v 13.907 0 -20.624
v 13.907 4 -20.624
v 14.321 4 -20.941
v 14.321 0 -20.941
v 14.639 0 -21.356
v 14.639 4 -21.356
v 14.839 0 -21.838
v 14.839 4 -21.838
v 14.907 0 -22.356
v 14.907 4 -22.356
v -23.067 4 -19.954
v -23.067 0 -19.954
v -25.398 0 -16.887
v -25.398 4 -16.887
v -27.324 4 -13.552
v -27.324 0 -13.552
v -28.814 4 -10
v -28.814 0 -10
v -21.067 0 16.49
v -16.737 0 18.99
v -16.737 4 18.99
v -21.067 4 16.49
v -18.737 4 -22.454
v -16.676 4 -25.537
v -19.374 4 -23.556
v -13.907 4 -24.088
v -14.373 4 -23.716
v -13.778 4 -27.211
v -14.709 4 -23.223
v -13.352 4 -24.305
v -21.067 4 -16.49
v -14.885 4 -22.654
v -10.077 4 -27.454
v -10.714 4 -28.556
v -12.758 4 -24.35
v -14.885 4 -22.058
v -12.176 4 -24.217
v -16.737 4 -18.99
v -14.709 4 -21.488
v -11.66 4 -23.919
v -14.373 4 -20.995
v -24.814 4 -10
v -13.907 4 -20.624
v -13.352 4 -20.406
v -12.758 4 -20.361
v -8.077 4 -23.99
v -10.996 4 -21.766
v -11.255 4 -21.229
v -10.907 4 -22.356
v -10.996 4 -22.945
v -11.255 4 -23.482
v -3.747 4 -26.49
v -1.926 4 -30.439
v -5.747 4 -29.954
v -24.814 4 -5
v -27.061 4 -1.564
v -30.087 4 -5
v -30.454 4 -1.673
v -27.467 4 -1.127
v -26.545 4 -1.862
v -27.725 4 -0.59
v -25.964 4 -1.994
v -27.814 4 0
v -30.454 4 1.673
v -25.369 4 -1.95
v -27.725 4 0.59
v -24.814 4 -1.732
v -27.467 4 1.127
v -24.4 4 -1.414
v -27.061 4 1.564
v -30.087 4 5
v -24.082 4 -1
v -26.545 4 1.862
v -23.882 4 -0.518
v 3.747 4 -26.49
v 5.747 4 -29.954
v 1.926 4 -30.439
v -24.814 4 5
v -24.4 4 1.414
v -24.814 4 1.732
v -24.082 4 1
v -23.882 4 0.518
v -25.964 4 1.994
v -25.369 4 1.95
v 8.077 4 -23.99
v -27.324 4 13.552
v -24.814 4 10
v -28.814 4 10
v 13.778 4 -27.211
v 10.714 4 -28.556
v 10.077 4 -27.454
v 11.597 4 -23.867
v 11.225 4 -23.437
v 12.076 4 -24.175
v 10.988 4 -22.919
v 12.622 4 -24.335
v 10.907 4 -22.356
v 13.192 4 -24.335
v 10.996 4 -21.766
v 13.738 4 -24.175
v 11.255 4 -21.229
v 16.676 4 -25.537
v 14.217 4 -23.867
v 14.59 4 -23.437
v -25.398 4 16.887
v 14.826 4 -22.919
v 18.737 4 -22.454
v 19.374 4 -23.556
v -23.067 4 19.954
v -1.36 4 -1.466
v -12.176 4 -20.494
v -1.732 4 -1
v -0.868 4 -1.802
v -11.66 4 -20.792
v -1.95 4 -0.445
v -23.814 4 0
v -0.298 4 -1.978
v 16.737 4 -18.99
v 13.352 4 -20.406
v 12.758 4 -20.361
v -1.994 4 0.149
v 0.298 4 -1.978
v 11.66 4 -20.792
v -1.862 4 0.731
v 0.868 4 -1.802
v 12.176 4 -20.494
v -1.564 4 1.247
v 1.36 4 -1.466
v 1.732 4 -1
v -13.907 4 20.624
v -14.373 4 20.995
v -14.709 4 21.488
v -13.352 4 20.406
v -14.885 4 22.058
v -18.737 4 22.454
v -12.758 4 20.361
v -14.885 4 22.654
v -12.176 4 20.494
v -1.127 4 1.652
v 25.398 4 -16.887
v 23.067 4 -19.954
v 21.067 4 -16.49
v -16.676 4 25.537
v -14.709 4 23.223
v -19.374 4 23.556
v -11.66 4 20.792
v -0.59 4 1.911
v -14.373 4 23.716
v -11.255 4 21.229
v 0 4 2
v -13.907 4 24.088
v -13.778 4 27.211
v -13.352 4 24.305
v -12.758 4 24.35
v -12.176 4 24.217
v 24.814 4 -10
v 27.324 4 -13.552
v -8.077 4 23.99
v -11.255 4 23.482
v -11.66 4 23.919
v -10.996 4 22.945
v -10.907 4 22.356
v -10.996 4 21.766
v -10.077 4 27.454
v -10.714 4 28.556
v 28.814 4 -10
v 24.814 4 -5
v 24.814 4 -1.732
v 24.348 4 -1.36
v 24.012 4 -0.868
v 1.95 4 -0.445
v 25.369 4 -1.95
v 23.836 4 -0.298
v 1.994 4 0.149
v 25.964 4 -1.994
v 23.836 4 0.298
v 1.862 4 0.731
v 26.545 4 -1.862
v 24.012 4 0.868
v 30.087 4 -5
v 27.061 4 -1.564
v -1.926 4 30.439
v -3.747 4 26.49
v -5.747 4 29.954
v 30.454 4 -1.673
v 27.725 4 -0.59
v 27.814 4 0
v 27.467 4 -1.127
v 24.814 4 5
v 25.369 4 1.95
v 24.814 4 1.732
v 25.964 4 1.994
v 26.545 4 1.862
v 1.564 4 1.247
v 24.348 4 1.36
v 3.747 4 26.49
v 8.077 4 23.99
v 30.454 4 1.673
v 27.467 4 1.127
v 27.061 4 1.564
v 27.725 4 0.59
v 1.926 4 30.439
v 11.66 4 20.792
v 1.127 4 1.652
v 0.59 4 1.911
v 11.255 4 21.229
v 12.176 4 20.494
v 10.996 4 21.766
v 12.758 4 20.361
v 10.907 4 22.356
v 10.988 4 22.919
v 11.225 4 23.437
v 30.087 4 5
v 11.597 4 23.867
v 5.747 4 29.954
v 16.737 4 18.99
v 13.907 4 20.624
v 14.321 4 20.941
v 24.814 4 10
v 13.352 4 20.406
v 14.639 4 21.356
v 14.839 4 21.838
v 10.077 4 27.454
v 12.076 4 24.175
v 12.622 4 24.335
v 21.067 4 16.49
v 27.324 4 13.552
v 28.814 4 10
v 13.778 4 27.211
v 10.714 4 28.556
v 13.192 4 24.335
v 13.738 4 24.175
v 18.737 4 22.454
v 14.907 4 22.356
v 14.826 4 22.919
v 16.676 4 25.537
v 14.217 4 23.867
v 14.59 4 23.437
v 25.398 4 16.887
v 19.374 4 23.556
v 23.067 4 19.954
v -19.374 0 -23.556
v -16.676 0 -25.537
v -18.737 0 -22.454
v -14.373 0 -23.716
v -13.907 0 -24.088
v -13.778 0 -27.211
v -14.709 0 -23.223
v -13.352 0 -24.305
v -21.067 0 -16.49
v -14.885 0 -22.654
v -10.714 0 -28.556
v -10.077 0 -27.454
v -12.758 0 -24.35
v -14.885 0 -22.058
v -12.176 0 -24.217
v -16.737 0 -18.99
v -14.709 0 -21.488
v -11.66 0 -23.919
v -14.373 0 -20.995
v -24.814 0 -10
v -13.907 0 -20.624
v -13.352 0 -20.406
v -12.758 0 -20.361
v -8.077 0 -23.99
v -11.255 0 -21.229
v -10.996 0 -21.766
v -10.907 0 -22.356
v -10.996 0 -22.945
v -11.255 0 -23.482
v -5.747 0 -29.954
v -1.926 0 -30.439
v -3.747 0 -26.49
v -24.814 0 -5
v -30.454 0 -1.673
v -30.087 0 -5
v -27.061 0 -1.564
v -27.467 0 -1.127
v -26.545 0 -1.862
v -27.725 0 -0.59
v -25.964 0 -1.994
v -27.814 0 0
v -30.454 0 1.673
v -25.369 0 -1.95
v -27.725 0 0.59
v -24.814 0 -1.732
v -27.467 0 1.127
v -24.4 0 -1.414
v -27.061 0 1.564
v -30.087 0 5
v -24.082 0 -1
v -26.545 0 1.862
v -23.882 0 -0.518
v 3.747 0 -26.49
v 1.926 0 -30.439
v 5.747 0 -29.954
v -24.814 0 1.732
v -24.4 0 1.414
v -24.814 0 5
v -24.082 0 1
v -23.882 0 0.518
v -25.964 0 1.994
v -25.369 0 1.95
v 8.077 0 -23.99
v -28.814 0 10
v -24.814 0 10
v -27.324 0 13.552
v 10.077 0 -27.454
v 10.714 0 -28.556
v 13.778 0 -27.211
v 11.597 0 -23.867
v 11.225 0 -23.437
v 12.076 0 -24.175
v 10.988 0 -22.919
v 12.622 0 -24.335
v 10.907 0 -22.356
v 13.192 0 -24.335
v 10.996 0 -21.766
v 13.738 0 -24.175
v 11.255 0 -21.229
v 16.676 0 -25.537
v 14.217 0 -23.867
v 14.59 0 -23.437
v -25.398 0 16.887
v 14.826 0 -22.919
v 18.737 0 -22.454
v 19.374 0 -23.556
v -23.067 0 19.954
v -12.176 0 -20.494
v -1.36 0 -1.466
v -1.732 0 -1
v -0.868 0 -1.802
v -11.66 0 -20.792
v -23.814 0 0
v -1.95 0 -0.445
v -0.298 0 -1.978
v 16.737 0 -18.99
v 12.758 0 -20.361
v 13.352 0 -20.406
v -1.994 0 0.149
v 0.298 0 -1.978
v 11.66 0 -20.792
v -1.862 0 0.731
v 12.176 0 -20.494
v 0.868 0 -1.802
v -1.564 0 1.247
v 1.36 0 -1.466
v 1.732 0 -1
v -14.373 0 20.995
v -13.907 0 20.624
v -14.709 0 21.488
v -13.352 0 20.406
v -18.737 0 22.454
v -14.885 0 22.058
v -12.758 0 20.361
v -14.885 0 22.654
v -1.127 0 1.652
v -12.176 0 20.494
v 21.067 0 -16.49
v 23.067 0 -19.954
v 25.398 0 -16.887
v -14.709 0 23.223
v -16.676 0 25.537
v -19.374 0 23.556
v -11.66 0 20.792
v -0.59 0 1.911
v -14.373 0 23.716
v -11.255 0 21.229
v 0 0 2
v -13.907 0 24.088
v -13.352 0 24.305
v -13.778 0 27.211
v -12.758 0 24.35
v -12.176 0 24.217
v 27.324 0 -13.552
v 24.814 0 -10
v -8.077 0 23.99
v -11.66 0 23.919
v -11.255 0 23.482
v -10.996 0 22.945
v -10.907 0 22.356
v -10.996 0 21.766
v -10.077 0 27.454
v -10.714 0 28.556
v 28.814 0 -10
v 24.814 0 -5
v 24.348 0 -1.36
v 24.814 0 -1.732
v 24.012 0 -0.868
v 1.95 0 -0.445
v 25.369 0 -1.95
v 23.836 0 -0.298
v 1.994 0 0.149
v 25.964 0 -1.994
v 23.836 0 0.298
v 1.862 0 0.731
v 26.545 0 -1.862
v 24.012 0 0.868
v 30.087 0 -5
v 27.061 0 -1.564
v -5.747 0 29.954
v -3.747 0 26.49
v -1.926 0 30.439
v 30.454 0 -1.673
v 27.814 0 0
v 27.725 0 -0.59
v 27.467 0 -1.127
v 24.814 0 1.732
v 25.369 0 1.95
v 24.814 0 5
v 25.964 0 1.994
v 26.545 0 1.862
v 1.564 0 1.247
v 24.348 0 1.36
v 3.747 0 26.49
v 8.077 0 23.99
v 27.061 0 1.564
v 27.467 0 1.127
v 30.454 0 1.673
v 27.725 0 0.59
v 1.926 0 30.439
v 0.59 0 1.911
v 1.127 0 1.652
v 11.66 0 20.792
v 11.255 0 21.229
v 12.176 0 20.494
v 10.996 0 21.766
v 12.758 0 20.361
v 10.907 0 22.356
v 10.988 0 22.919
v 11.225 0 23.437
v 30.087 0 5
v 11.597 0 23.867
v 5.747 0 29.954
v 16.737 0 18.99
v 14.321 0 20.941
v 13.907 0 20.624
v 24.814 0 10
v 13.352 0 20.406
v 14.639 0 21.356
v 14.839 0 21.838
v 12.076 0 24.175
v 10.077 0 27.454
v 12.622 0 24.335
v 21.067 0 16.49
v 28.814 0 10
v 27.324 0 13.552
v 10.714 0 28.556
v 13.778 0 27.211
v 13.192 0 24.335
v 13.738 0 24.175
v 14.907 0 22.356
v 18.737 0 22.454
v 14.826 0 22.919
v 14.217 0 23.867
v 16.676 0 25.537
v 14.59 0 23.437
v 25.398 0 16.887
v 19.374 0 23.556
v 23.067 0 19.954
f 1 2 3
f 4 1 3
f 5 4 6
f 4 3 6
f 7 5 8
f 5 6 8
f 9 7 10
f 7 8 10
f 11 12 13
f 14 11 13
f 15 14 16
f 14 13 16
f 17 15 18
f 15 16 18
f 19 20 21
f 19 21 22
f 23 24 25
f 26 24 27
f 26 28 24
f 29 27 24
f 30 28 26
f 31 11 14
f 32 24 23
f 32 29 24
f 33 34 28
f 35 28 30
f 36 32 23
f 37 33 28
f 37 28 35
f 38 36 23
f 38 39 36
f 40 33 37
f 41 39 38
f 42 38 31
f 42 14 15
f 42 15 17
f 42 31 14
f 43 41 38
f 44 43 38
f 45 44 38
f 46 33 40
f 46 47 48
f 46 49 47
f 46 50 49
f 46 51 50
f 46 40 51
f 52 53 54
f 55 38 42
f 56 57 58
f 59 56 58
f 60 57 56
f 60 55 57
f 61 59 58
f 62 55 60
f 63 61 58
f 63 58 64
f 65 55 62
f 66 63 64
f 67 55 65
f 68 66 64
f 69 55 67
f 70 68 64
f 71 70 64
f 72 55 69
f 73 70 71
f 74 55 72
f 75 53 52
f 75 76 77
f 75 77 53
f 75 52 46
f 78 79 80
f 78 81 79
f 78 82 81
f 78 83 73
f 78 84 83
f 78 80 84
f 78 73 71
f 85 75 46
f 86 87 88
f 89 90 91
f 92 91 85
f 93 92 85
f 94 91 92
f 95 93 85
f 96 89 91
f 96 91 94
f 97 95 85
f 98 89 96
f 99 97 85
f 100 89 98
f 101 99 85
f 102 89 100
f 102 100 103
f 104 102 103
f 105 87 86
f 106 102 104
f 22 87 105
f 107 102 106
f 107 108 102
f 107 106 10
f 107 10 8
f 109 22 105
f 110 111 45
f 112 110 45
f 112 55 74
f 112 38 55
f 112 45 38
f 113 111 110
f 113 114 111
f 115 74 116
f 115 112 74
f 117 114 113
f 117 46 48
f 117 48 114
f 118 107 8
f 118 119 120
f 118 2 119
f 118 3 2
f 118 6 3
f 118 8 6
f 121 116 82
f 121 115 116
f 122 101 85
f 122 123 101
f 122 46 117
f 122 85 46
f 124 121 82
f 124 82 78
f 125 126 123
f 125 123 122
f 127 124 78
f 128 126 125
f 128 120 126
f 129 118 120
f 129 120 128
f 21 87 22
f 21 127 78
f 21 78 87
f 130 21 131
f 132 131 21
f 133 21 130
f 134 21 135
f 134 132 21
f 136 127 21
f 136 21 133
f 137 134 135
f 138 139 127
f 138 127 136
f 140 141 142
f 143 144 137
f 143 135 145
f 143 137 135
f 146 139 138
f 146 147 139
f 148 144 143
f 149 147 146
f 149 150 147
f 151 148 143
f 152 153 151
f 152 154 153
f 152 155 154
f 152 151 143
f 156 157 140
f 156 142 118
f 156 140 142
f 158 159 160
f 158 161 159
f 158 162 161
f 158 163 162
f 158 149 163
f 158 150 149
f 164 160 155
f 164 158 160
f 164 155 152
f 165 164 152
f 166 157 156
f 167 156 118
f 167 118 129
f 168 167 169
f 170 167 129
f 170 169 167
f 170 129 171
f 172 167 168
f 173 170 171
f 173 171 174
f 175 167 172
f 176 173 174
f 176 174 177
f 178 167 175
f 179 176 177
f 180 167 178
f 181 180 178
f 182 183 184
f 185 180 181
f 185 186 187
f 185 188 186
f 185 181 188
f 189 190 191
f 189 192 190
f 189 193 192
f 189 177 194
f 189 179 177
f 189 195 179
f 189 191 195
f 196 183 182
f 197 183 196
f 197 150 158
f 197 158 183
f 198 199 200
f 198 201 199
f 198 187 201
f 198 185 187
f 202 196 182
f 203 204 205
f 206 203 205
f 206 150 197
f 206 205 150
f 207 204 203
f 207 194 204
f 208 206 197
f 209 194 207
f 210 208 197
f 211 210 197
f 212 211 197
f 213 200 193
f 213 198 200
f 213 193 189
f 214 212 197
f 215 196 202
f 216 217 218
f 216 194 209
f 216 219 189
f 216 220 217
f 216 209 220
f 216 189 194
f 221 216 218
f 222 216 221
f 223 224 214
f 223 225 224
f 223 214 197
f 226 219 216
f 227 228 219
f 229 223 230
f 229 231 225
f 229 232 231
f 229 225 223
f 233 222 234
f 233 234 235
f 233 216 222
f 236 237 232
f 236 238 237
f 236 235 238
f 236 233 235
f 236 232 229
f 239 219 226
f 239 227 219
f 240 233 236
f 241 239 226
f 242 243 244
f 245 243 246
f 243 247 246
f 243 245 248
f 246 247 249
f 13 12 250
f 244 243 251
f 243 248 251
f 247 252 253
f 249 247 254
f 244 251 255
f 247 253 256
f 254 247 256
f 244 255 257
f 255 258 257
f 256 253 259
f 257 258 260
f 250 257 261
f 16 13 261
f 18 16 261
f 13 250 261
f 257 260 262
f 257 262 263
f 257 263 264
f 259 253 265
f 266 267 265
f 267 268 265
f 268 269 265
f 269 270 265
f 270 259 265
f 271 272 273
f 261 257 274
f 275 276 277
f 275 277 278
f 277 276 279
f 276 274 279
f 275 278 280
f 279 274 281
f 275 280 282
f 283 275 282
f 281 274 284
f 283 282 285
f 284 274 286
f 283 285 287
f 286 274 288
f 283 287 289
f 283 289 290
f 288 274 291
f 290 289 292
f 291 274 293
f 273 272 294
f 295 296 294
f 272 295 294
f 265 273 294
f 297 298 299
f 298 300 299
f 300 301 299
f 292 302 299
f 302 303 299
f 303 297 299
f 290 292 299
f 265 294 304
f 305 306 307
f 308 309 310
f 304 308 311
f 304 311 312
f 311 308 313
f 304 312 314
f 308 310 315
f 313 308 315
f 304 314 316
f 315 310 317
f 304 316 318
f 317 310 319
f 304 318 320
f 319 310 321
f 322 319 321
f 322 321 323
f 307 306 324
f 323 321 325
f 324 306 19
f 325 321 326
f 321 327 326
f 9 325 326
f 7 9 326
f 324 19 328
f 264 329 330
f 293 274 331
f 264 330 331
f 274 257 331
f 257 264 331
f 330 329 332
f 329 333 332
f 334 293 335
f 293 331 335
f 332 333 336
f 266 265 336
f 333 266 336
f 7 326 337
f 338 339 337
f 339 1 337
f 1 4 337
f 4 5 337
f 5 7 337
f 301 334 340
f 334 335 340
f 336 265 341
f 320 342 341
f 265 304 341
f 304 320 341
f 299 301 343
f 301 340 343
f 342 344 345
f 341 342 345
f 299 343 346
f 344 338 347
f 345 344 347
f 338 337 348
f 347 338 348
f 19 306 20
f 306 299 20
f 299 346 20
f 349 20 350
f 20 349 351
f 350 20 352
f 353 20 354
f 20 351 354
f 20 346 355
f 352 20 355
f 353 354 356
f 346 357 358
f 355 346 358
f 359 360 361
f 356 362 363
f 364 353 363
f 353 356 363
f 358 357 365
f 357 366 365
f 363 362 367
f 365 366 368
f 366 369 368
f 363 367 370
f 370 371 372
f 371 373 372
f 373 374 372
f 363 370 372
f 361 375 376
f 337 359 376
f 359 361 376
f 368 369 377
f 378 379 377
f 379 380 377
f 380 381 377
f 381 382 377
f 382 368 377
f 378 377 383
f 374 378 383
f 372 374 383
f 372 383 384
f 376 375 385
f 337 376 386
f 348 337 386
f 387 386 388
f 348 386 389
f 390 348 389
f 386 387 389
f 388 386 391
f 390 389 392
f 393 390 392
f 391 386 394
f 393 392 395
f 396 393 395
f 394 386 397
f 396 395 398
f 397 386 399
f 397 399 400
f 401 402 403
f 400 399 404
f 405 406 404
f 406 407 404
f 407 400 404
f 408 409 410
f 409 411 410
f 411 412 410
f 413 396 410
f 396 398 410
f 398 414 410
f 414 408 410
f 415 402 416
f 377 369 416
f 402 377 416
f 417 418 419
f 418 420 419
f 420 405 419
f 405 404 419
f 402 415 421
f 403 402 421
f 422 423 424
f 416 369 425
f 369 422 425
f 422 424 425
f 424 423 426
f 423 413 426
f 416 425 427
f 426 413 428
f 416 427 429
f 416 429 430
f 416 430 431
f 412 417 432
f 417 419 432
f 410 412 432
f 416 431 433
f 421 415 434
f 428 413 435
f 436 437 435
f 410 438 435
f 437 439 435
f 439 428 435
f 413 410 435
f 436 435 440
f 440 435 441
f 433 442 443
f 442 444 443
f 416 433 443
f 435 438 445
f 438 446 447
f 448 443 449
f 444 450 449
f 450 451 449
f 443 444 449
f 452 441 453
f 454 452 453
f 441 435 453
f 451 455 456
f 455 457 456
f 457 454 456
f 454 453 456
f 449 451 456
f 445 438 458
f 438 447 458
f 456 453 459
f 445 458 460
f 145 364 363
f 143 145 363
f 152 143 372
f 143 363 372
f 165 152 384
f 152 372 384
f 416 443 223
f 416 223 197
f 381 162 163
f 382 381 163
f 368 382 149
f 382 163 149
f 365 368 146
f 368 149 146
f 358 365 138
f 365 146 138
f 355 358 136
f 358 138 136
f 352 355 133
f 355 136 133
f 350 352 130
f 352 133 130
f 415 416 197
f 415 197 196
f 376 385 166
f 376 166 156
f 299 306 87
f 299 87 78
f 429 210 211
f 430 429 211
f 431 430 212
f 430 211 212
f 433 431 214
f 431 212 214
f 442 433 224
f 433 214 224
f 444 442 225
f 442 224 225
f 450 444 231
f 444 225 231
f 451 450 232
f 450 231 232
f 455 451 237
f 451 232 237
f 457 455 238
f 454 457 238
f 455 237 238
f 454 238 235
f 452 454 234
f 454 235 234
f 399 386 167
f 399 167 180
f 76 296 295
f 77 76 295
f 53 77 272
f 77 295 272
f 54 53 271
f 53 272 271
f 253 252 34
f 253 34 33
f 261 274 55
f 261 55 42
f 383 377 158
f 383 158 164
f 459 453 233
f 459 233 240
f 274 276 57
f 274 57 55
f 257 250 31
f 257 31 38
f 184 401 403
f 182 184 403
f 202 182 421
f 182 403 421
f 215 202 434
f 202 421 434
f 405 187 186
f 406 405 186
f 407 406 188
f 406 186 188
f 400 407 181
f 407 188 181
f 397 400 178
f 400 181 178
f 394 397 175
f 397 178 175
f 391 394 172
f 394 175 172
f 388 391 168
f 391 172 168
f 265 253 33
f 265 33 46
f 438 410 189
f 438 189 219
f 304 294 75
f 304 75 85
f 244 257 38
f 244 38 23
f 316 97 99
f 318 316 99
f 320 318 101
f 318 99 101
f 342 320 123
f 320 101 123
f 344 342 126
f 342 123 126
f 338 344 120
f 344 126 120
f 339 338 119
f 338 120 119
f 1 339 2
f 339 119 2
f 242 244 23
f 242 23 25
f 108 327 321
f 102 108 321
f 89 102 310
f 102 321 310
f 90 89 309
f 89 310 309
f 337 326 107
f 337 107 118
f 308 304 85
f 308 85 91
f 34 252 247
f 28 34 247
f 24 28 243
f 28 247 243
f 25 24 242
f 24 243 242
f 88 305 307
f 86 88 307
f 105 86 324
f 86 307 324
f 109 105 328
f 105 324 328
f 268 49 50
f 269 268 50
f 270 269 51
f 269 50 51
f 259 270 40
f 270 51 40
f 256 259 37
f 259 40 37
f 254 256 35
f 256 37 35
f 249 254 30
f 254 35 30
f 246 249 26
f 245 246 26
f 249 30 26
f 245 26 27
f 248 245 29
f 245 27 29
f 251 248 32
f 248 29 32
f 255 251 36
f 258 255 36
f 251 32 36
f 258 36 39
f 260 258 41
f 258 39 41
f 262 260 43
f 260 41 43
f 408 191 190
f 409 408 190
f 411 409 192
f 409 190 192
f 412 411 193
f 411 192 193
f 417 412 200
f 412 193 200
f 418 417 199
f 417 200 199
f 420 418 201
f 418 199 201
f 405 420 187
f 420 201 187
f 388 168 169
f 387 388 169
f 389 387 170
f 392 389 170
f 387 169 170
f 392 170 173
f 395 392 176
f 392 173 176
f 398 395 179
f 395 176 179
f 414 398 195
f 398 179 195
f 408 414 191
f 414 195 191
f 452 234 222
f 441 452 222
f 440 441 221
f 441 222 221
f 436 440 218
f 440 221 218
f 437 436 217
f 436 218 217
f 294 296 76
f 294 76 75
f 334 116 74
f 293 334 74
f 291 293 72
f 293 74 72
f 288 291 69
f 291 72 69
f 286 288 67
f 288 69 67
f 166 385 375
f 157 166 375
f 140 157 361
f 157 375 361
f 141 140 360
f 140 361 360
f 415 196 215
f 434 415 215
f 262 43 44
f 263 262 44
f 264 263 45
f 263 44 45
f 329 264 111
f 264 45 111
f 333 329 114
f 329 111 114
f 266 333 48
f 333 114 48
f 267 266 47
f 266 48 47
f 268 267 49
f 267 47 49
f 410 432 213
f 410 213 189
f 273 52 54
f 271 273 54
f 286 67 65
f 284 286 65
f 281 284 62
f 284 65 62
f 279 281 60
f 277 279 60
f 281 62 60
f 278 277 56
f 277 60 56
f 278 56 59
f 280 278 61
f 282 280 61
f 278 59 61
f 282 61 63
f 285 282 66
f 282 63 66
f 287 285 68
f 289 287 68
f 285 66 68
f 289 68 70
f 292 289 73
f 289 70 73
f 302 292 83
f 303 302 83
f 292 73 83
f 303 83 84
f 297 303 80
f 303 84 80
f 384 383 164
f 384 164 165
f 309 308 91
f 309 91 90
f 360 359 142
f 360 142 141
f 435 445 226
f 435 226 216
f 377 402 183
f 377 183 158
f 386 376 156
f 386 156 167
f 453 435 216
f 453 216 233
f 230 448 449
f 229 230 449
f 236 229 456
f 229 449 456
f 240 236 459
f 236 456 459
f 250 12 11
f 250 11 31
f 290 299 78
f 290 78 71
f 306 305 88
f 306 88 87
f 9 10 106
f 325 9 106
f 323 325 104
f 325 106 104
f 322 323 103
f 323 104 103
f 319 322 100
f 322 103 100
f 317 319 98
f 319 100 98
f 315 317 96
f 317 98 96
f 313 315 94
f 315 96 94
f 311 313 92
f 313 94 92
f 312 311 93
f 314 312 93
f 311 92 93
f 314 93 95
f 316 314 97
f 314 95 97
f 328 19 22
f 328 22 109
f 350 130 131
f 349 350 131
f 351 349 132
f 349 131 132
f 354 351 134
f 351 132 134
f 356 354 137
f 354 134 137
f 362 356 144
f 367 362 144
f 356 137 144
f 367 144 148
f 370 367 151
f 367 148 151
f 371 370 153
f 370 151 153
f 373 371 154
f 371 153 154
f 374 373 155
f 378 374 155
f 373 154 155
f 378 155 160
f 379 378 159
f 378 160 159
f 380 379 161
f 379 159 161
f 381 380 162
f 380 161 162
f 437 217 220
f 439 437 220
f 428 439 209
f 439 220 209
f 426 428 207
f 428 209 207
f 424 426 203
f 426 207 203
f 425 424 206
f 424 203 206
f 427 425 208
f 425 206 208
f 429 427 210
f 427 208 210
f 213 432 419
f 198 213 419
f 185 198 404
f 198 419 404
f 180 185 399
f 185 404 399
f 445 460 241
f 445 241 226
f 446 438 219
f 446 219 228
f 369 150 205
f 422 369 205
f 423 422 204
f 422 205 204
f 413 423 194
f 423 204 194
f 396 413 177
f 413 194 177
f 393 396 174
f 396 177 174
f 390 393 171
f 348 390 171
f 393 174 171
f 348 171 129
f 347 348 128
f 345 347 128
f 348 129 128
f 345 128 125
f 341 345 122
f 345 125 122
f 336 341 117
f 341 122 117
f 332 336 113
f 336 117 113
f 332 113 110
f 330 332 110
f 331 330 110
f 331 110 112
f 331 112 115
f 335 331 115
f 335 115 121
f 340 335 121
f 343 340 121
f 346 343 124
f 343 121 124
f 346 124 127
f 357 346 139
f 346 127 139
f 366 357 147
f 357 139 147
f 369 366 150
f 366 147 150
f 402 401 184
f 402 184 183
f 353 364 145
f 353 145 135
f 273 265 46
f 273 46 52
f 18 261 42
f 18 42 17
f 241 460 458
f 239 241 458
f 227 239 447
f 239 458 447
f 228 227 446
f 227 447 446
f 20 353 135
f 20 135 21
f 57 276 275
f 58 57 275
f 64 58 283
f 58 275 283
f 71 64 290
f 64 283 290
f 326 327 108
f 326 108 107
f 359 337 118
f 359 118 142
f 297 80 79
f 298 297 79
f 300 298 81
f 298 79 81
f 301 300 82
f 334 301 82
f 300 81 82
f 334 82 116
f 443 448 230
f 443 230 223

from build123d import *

# Parameters (mm, degrees)
CROQUIS1_R              = 30.5
SALIENTE_EXTRUIR1_DEPTH = 4
CROQUIS2_R              = 2
CORTAR_EXTRUIR1_DEPTH   = 4
CORTAR_EXTRUIR3_START   = -4
CORTAR_EXTRUIR3_DEPTH   = 4
CORTAR_EXTRUIR4_DEPTH   = 10


with BuildPart() as part:
    # Croquis1 → Saliente-Extruir1 (new body)
    with BuildSketch(Plane(origin=(0, 0, 0), x_dir=(1, 0, 0), z_dir=(0, 1, 0))):
        with Locations(Location((0, 0, 0), (0, 0, 270))):
            Circle(CROQUIS1_R)
    extrude(amount=SALIENTE_EXTRUIR1_DEPTH)

    # Croquis2 → Cortar-Extruir1 (cut)
    with BuildSketch(Plane(origin=(0, 4, 0), x_dir=(1, 0, 0), z_dir=(0, 1, 0))):
        with Locations(Location((0, 0, 0), (0, 0, 270))):
            Circle(CROQUIS2_R)
    extrude(amount=-CORTAR_EXTRUIR1_DEPTH, mode=Mode.SUBTRACT)

    # Croquis5 → Cortar-Extruir3 (cut)
    with BuildSketch(Plane(origin=(0, 4, 0), x_dir=(1, 0, 0), z_dir=(0, 1, 0)).offset(CORTAR_EXTRUIR3_START)):
        with BuildLine():
            ThreePointArc((-28.814059068, 10), (-29.556634924, 7.526973624), (-30.087372767, 5))
            Line((-30.087372767, 5), (-28.814059068, 5))
            Line((-28.814059068, 5), (-24.814059068, 5))
            Line((-24.814059068, 5), (-24.814059068, 10))
            Line((-24.814059068, 10), (-28.814059068, 10))
        make_face()
        with BuildLine():
            Line((28.814059068, 5), (30.087372767, 5))
            ThreePointArc((30.087372767, 5), (29.556634924, 7.526973624), (28.814059068, 10))
            Line((28.814059068, 10), (24.814059068, 10))
            Line((24.814059068, 10), (24.814059068, 5))
            Line((24.814059068, 5), (28.814059068, 5))
        make_face()
        with BuildLine():
            Line((30.087372767, -5), (28.814059068, -5))
            Line((28.814059068, -5), (24.814059068, -5))
            Line((24.814059068, -5), (24.814059068, -10))
            Line((24.814059068, -10), (28.814059068, -10))
            ThreePointArc((28.814059068, -10), (29.556634924, -7.526973624), (30.087372767, -5))
        make_face()
        with BuildLine():
            ThreePointArc((19.373813402, -23.556429149), (21.296867835, -21.833309883), (23.067283572, -19.953707139))
            Line((23.067283572, -19.953707139), (21.067283572, -16.489605524))
            Line((21.067283572, -16.489605524), (16.737156553, -18.989605524))
            Line((16.737156553, -18.989605524), (18.737156553, -22.453707139))
            Line((18.737156553, -22.453707139), (19.373813402, -23.556429149))
        make_face()
        with BuildLine():
            ThreePointArc((5.746775496, -29.953707139), (8.25976709, -29.360283507), (10.713559364, -28.556429149))
            Line((10.713559364, -28.556429149), (10.076902515, -27.453707139))
            Line((10.076902515, -27.453707139), (8.076902515, -23.989605524))
            Line((8.076902515, -23.989605524), (3.746775496, -26.489605524))
            Line((3.746775496, -26.489605524), (5.746775496, -29.953707139))
        make_face()
        with BuildLine():
            ThreePointArc((-10.713559364, -28.556429149), (-8.25976709, -29.360283507), (-5.746775496, -29.953707139))
            Line((-5.746775496, -29.953707139), (-3.746775496, -26.489605524))
            Line((-3.746775496, -26.489605524), (-8.076902515, -23.989605524))
            Line((-8.076902515, -23.989605524), (-10.076902515, -27.453707139))
            Line((-10.076902515, -27.453707139), (-10.713559364, -28.556429149))
        make_face()
        with BuildLine():
            ThreePointArc((-23.067283572, -19.953707139), (-21.296867835, -21.833309883), (-19.373813402, -23.556429149))
            Line((-19.373813402, -23.556429149), (-18.737156553, -22.453707139))
            Line((-18.737156553, -22.453707139), (-16.737156553, -18.989605524))
            Line((-16.737156553, -18.989605524), (-21.067283572, -16.489605524))
            Line((-21.067283572, -16.489605524), (-23.067283572, -19.953707139))
        make_face()
        with BuildLine():
            ThreePointArc((-30.087372767, -5), (-29.556634924, -7.526973624), (-28.814059068, -10))
            Line((-28.814059068, -10), (-24.814059068, -10))
            Line((-24.814059068, -10), (-24.814059068, -5))
            Line((-24.814059068, -5), (-28.814059068, -5))
            Line((-28.814059068, -5), (-30.087372767, -5))
        make_face()
        with BuildLine():
            Line((-18.737156553, 22.453707139), (-19.373813402, 23.556429149))
            ThreePointArc((-19.373813402, 23.556429149), (-21.296867835, 21.833309883), (-23.067283572, 19.953707139))
            Line((-23.067283572, 19.953707139), (-21.067283572, 16.489605524))
            Line((-21.067283572, 16.489605524), (-16.737156553, 18.989605524))
            Line((-16.737156553, 18.989605524), (-18.737156553, 22.453707139))
        make_face()
        with BuildLine():
            Line((-3.746775496, 26.489605524), (-5.746775496, 29.953707139))
            ThreePointArc((-5.746775496, 29.953707139), (-8.25976709, 29.360283507), (-10.713559364, 28.556429149))
            Line((-10.713559364, 28.556429149), (-10.076902515, 27.453707139))
            Line((-10.076902515, 27.453707139), (-8.076902515, 23.989605524))
            Line((-8.076902515, 23.989605524), (-3.746775496, 26.489605524))
        make_face()
        with BuildLine():
            Line((10.076902515, 27.453707139), (10.713559364, 28.556429149))
            ThreePointArc((10.713559364, 28.556429149), (8.25976709, 29.360283507), (5.746775496, 29.953707139))
            Line((5.746775496, 29.953707139), (3.746775496, 26.489605524))
            Line((3.746775496, 26.489605524), (8.076902515, 23.989605524))
            Line((8.076902515, 23.989605524), (10.076902515, 27.453707139))
        make_face()
        with BuildLine():
            Line((21.067283572, 16.489605524), (23.067283572, 19.953707139))
            ThreePointArc((23.067283572, 19.953707139), (21.296867835, 21.833309883), (19.373813402, 23.556429149))
            Line((19.373813402, 23.556429149), (18.737156553, 22.453707139))
            Line((18.737156553, 22.453707139), (16.737156553, 18.989605524))
            Line((16.737156553, 18.989605524), (21.067283572, 16.489605524))
        make_face()
    extrude(amount=CORTAR_EXTRUIR3_DEPTH, mode=Mode.SUBTRACT)

    # Croquis7 → Cortar-Extruir4 (cut)
    with BuildSketch(Plane(origin=(0, 4, 0), x_dir=(1, 0, 0), z_dir=(0, 1, 0))):
        with BuildLine():
            ThreePointArc((-13.907029535, 20.623580122), (-11.907029535, 20.623580122), (-10.907029535, 22.355630929))
            Line((-10.907029535, 22.355630929), (-12.907029535, 22.355630929))
            Line((-12.907029535, 22.355630929), (-13.907029535, 20.623580122))
        make_face()
        with BuildLine():
            Line((-12.907029535, 22.355630929), (-10.907029535, 22.355630929))
            ThreePointArc((-10.907029535, 22.355630929), (-13.907029535, 24.087681737), (-13.907029535, 20.623580122))
            Line((-13.907029535, 20.623580122), (-12.907029535, 22.355630929))
        make_face()
        with BuildLine():
            ThreePointArc((-23.81405907, 0), (-24.082008262, 1), (-24.81405907, 1.732050808))
            Line((-24.81405907, 1.732050808), (-25.81405907, 0))
            Line((-25.81405907, 0), (-24.81405907, -1.732050808))
            ThreePointArc((-24.81405907, -1.732050808), (-24.082008262, -1), (-23.81405907, 0))
        make_face()
        with BuildLine():
            Line((-25.81405907, 0), (-24.81405907, 1.732050808))
            ThreePointArc((-24.81405907, 1.732050808), (-27.81405907, 0), (-24.81405907, -1.732050808))
            Line((-24.81405907, -1.732050808), (-25.81405907, 0))
        make_face()
        with BuildLine():
            ThreePointArc((10.907029535, 22.355630929), (11.907029535, 20.623580122), (13.907029535, 20.623580122))
            Line((13.907029535, 20.623580122), (12.907029535, 22.355630929))
            Line((12.907029535, 22.355630929), (10.907029535, 22.355630929))
        make_face()
        with BuildLine():
            Line((12.907029535, 22.355630929), (13.907029535, 20.623580122))
            ThreePointArc((13.907029535, 20.623580122), (14.639080343, 21.355630929), (14.907029535, 22.355630929))
            ThreePointArc((14.907029535, 22.355630929), (12.907029535, 24.355630929), (10.907029535, 22.355630929))
            Line((10.907029535, 22.355630929), (12.907029535, 22.355630929))
        make_face()
        with BuildLine():
            Line((24.81405907, -1.732050808), (25.81405907, 0))
            Line((25.81405907, 0), (24.81405907, 1.732050808))
            ThreePointArc((24.81405907, 1.732050808), (23.81405907, 0), (24.81405907, -1.732050808))
        make_face()
        with BuildLine():
            Line((24.81405907, 1.732050808), (25.81405907, 0))
            Line((25.81405907, 0), (24.81405907, -1.732050808))
            ThreePointArc((24.81405907, -1.732050808), (26.81405907, -1.732050808), (27.81405907, 0))
            ThreePointArc((27.81405907, 0), (26.81405907, 1.732050808), (24.81405907, 1.732050808))
        make_face()
        with BuildLine():
            ThreePointArc((-13.907029535, -20.623580122), (-13.907029535, -24.087681737), (-10.907029535, -22.355630929))
            Line((-10.907029535, -22.355630929), (-12.907029535, -22.355630929))
            Line((-12.907029535, -22.355630929), (-13.907029535, -20.623580122))
        make_face()
        with BuildLine():
            Line((-12.907029535, -22.355630929), (-10.907029535, -22.355630929))
            ThreePointArc((-10.907029535, -22.355630929), (-11.907029535, -20.623580122), (-13.907029535, -20.623580122))
            Line((-13.907029535, -20.623580122), (-12.907029535, -22.355630929))
        make_face()
        with BuildLine():
            ThreePointArc((14.907029535, -22.355630929), (14.639080343, -21.355630929), (13.907029535, -20.623580122))
            Line((13.907029535, -20.623580122), (12.907029535, -22.355630929))
            Line((12.907029535, -22.355630929), (10.907029535, -22.355630929))
            ThreePointArc((10.907029535, -22.355630929), (12.907029535, -24.355630929), (14.907029535, -22.355630929))
        make_face()
        with BuildLine():
            Line((12.907029535, -22.355630929), (13.907029535, -20.623580122))
            ThreePointArc((13.907029535, -20.623580122), (11.907029535, -20.623580122), (10.907029535, -22.355630929))
            Line((10.907029535, -22.355630929), (12.907029535, -22.355630929))
        make_face()
    extrude(amount=-CORTAR_EXTRUIR4_DEPTH, mode=Mode.SUBTRACT)


solid = part.part
